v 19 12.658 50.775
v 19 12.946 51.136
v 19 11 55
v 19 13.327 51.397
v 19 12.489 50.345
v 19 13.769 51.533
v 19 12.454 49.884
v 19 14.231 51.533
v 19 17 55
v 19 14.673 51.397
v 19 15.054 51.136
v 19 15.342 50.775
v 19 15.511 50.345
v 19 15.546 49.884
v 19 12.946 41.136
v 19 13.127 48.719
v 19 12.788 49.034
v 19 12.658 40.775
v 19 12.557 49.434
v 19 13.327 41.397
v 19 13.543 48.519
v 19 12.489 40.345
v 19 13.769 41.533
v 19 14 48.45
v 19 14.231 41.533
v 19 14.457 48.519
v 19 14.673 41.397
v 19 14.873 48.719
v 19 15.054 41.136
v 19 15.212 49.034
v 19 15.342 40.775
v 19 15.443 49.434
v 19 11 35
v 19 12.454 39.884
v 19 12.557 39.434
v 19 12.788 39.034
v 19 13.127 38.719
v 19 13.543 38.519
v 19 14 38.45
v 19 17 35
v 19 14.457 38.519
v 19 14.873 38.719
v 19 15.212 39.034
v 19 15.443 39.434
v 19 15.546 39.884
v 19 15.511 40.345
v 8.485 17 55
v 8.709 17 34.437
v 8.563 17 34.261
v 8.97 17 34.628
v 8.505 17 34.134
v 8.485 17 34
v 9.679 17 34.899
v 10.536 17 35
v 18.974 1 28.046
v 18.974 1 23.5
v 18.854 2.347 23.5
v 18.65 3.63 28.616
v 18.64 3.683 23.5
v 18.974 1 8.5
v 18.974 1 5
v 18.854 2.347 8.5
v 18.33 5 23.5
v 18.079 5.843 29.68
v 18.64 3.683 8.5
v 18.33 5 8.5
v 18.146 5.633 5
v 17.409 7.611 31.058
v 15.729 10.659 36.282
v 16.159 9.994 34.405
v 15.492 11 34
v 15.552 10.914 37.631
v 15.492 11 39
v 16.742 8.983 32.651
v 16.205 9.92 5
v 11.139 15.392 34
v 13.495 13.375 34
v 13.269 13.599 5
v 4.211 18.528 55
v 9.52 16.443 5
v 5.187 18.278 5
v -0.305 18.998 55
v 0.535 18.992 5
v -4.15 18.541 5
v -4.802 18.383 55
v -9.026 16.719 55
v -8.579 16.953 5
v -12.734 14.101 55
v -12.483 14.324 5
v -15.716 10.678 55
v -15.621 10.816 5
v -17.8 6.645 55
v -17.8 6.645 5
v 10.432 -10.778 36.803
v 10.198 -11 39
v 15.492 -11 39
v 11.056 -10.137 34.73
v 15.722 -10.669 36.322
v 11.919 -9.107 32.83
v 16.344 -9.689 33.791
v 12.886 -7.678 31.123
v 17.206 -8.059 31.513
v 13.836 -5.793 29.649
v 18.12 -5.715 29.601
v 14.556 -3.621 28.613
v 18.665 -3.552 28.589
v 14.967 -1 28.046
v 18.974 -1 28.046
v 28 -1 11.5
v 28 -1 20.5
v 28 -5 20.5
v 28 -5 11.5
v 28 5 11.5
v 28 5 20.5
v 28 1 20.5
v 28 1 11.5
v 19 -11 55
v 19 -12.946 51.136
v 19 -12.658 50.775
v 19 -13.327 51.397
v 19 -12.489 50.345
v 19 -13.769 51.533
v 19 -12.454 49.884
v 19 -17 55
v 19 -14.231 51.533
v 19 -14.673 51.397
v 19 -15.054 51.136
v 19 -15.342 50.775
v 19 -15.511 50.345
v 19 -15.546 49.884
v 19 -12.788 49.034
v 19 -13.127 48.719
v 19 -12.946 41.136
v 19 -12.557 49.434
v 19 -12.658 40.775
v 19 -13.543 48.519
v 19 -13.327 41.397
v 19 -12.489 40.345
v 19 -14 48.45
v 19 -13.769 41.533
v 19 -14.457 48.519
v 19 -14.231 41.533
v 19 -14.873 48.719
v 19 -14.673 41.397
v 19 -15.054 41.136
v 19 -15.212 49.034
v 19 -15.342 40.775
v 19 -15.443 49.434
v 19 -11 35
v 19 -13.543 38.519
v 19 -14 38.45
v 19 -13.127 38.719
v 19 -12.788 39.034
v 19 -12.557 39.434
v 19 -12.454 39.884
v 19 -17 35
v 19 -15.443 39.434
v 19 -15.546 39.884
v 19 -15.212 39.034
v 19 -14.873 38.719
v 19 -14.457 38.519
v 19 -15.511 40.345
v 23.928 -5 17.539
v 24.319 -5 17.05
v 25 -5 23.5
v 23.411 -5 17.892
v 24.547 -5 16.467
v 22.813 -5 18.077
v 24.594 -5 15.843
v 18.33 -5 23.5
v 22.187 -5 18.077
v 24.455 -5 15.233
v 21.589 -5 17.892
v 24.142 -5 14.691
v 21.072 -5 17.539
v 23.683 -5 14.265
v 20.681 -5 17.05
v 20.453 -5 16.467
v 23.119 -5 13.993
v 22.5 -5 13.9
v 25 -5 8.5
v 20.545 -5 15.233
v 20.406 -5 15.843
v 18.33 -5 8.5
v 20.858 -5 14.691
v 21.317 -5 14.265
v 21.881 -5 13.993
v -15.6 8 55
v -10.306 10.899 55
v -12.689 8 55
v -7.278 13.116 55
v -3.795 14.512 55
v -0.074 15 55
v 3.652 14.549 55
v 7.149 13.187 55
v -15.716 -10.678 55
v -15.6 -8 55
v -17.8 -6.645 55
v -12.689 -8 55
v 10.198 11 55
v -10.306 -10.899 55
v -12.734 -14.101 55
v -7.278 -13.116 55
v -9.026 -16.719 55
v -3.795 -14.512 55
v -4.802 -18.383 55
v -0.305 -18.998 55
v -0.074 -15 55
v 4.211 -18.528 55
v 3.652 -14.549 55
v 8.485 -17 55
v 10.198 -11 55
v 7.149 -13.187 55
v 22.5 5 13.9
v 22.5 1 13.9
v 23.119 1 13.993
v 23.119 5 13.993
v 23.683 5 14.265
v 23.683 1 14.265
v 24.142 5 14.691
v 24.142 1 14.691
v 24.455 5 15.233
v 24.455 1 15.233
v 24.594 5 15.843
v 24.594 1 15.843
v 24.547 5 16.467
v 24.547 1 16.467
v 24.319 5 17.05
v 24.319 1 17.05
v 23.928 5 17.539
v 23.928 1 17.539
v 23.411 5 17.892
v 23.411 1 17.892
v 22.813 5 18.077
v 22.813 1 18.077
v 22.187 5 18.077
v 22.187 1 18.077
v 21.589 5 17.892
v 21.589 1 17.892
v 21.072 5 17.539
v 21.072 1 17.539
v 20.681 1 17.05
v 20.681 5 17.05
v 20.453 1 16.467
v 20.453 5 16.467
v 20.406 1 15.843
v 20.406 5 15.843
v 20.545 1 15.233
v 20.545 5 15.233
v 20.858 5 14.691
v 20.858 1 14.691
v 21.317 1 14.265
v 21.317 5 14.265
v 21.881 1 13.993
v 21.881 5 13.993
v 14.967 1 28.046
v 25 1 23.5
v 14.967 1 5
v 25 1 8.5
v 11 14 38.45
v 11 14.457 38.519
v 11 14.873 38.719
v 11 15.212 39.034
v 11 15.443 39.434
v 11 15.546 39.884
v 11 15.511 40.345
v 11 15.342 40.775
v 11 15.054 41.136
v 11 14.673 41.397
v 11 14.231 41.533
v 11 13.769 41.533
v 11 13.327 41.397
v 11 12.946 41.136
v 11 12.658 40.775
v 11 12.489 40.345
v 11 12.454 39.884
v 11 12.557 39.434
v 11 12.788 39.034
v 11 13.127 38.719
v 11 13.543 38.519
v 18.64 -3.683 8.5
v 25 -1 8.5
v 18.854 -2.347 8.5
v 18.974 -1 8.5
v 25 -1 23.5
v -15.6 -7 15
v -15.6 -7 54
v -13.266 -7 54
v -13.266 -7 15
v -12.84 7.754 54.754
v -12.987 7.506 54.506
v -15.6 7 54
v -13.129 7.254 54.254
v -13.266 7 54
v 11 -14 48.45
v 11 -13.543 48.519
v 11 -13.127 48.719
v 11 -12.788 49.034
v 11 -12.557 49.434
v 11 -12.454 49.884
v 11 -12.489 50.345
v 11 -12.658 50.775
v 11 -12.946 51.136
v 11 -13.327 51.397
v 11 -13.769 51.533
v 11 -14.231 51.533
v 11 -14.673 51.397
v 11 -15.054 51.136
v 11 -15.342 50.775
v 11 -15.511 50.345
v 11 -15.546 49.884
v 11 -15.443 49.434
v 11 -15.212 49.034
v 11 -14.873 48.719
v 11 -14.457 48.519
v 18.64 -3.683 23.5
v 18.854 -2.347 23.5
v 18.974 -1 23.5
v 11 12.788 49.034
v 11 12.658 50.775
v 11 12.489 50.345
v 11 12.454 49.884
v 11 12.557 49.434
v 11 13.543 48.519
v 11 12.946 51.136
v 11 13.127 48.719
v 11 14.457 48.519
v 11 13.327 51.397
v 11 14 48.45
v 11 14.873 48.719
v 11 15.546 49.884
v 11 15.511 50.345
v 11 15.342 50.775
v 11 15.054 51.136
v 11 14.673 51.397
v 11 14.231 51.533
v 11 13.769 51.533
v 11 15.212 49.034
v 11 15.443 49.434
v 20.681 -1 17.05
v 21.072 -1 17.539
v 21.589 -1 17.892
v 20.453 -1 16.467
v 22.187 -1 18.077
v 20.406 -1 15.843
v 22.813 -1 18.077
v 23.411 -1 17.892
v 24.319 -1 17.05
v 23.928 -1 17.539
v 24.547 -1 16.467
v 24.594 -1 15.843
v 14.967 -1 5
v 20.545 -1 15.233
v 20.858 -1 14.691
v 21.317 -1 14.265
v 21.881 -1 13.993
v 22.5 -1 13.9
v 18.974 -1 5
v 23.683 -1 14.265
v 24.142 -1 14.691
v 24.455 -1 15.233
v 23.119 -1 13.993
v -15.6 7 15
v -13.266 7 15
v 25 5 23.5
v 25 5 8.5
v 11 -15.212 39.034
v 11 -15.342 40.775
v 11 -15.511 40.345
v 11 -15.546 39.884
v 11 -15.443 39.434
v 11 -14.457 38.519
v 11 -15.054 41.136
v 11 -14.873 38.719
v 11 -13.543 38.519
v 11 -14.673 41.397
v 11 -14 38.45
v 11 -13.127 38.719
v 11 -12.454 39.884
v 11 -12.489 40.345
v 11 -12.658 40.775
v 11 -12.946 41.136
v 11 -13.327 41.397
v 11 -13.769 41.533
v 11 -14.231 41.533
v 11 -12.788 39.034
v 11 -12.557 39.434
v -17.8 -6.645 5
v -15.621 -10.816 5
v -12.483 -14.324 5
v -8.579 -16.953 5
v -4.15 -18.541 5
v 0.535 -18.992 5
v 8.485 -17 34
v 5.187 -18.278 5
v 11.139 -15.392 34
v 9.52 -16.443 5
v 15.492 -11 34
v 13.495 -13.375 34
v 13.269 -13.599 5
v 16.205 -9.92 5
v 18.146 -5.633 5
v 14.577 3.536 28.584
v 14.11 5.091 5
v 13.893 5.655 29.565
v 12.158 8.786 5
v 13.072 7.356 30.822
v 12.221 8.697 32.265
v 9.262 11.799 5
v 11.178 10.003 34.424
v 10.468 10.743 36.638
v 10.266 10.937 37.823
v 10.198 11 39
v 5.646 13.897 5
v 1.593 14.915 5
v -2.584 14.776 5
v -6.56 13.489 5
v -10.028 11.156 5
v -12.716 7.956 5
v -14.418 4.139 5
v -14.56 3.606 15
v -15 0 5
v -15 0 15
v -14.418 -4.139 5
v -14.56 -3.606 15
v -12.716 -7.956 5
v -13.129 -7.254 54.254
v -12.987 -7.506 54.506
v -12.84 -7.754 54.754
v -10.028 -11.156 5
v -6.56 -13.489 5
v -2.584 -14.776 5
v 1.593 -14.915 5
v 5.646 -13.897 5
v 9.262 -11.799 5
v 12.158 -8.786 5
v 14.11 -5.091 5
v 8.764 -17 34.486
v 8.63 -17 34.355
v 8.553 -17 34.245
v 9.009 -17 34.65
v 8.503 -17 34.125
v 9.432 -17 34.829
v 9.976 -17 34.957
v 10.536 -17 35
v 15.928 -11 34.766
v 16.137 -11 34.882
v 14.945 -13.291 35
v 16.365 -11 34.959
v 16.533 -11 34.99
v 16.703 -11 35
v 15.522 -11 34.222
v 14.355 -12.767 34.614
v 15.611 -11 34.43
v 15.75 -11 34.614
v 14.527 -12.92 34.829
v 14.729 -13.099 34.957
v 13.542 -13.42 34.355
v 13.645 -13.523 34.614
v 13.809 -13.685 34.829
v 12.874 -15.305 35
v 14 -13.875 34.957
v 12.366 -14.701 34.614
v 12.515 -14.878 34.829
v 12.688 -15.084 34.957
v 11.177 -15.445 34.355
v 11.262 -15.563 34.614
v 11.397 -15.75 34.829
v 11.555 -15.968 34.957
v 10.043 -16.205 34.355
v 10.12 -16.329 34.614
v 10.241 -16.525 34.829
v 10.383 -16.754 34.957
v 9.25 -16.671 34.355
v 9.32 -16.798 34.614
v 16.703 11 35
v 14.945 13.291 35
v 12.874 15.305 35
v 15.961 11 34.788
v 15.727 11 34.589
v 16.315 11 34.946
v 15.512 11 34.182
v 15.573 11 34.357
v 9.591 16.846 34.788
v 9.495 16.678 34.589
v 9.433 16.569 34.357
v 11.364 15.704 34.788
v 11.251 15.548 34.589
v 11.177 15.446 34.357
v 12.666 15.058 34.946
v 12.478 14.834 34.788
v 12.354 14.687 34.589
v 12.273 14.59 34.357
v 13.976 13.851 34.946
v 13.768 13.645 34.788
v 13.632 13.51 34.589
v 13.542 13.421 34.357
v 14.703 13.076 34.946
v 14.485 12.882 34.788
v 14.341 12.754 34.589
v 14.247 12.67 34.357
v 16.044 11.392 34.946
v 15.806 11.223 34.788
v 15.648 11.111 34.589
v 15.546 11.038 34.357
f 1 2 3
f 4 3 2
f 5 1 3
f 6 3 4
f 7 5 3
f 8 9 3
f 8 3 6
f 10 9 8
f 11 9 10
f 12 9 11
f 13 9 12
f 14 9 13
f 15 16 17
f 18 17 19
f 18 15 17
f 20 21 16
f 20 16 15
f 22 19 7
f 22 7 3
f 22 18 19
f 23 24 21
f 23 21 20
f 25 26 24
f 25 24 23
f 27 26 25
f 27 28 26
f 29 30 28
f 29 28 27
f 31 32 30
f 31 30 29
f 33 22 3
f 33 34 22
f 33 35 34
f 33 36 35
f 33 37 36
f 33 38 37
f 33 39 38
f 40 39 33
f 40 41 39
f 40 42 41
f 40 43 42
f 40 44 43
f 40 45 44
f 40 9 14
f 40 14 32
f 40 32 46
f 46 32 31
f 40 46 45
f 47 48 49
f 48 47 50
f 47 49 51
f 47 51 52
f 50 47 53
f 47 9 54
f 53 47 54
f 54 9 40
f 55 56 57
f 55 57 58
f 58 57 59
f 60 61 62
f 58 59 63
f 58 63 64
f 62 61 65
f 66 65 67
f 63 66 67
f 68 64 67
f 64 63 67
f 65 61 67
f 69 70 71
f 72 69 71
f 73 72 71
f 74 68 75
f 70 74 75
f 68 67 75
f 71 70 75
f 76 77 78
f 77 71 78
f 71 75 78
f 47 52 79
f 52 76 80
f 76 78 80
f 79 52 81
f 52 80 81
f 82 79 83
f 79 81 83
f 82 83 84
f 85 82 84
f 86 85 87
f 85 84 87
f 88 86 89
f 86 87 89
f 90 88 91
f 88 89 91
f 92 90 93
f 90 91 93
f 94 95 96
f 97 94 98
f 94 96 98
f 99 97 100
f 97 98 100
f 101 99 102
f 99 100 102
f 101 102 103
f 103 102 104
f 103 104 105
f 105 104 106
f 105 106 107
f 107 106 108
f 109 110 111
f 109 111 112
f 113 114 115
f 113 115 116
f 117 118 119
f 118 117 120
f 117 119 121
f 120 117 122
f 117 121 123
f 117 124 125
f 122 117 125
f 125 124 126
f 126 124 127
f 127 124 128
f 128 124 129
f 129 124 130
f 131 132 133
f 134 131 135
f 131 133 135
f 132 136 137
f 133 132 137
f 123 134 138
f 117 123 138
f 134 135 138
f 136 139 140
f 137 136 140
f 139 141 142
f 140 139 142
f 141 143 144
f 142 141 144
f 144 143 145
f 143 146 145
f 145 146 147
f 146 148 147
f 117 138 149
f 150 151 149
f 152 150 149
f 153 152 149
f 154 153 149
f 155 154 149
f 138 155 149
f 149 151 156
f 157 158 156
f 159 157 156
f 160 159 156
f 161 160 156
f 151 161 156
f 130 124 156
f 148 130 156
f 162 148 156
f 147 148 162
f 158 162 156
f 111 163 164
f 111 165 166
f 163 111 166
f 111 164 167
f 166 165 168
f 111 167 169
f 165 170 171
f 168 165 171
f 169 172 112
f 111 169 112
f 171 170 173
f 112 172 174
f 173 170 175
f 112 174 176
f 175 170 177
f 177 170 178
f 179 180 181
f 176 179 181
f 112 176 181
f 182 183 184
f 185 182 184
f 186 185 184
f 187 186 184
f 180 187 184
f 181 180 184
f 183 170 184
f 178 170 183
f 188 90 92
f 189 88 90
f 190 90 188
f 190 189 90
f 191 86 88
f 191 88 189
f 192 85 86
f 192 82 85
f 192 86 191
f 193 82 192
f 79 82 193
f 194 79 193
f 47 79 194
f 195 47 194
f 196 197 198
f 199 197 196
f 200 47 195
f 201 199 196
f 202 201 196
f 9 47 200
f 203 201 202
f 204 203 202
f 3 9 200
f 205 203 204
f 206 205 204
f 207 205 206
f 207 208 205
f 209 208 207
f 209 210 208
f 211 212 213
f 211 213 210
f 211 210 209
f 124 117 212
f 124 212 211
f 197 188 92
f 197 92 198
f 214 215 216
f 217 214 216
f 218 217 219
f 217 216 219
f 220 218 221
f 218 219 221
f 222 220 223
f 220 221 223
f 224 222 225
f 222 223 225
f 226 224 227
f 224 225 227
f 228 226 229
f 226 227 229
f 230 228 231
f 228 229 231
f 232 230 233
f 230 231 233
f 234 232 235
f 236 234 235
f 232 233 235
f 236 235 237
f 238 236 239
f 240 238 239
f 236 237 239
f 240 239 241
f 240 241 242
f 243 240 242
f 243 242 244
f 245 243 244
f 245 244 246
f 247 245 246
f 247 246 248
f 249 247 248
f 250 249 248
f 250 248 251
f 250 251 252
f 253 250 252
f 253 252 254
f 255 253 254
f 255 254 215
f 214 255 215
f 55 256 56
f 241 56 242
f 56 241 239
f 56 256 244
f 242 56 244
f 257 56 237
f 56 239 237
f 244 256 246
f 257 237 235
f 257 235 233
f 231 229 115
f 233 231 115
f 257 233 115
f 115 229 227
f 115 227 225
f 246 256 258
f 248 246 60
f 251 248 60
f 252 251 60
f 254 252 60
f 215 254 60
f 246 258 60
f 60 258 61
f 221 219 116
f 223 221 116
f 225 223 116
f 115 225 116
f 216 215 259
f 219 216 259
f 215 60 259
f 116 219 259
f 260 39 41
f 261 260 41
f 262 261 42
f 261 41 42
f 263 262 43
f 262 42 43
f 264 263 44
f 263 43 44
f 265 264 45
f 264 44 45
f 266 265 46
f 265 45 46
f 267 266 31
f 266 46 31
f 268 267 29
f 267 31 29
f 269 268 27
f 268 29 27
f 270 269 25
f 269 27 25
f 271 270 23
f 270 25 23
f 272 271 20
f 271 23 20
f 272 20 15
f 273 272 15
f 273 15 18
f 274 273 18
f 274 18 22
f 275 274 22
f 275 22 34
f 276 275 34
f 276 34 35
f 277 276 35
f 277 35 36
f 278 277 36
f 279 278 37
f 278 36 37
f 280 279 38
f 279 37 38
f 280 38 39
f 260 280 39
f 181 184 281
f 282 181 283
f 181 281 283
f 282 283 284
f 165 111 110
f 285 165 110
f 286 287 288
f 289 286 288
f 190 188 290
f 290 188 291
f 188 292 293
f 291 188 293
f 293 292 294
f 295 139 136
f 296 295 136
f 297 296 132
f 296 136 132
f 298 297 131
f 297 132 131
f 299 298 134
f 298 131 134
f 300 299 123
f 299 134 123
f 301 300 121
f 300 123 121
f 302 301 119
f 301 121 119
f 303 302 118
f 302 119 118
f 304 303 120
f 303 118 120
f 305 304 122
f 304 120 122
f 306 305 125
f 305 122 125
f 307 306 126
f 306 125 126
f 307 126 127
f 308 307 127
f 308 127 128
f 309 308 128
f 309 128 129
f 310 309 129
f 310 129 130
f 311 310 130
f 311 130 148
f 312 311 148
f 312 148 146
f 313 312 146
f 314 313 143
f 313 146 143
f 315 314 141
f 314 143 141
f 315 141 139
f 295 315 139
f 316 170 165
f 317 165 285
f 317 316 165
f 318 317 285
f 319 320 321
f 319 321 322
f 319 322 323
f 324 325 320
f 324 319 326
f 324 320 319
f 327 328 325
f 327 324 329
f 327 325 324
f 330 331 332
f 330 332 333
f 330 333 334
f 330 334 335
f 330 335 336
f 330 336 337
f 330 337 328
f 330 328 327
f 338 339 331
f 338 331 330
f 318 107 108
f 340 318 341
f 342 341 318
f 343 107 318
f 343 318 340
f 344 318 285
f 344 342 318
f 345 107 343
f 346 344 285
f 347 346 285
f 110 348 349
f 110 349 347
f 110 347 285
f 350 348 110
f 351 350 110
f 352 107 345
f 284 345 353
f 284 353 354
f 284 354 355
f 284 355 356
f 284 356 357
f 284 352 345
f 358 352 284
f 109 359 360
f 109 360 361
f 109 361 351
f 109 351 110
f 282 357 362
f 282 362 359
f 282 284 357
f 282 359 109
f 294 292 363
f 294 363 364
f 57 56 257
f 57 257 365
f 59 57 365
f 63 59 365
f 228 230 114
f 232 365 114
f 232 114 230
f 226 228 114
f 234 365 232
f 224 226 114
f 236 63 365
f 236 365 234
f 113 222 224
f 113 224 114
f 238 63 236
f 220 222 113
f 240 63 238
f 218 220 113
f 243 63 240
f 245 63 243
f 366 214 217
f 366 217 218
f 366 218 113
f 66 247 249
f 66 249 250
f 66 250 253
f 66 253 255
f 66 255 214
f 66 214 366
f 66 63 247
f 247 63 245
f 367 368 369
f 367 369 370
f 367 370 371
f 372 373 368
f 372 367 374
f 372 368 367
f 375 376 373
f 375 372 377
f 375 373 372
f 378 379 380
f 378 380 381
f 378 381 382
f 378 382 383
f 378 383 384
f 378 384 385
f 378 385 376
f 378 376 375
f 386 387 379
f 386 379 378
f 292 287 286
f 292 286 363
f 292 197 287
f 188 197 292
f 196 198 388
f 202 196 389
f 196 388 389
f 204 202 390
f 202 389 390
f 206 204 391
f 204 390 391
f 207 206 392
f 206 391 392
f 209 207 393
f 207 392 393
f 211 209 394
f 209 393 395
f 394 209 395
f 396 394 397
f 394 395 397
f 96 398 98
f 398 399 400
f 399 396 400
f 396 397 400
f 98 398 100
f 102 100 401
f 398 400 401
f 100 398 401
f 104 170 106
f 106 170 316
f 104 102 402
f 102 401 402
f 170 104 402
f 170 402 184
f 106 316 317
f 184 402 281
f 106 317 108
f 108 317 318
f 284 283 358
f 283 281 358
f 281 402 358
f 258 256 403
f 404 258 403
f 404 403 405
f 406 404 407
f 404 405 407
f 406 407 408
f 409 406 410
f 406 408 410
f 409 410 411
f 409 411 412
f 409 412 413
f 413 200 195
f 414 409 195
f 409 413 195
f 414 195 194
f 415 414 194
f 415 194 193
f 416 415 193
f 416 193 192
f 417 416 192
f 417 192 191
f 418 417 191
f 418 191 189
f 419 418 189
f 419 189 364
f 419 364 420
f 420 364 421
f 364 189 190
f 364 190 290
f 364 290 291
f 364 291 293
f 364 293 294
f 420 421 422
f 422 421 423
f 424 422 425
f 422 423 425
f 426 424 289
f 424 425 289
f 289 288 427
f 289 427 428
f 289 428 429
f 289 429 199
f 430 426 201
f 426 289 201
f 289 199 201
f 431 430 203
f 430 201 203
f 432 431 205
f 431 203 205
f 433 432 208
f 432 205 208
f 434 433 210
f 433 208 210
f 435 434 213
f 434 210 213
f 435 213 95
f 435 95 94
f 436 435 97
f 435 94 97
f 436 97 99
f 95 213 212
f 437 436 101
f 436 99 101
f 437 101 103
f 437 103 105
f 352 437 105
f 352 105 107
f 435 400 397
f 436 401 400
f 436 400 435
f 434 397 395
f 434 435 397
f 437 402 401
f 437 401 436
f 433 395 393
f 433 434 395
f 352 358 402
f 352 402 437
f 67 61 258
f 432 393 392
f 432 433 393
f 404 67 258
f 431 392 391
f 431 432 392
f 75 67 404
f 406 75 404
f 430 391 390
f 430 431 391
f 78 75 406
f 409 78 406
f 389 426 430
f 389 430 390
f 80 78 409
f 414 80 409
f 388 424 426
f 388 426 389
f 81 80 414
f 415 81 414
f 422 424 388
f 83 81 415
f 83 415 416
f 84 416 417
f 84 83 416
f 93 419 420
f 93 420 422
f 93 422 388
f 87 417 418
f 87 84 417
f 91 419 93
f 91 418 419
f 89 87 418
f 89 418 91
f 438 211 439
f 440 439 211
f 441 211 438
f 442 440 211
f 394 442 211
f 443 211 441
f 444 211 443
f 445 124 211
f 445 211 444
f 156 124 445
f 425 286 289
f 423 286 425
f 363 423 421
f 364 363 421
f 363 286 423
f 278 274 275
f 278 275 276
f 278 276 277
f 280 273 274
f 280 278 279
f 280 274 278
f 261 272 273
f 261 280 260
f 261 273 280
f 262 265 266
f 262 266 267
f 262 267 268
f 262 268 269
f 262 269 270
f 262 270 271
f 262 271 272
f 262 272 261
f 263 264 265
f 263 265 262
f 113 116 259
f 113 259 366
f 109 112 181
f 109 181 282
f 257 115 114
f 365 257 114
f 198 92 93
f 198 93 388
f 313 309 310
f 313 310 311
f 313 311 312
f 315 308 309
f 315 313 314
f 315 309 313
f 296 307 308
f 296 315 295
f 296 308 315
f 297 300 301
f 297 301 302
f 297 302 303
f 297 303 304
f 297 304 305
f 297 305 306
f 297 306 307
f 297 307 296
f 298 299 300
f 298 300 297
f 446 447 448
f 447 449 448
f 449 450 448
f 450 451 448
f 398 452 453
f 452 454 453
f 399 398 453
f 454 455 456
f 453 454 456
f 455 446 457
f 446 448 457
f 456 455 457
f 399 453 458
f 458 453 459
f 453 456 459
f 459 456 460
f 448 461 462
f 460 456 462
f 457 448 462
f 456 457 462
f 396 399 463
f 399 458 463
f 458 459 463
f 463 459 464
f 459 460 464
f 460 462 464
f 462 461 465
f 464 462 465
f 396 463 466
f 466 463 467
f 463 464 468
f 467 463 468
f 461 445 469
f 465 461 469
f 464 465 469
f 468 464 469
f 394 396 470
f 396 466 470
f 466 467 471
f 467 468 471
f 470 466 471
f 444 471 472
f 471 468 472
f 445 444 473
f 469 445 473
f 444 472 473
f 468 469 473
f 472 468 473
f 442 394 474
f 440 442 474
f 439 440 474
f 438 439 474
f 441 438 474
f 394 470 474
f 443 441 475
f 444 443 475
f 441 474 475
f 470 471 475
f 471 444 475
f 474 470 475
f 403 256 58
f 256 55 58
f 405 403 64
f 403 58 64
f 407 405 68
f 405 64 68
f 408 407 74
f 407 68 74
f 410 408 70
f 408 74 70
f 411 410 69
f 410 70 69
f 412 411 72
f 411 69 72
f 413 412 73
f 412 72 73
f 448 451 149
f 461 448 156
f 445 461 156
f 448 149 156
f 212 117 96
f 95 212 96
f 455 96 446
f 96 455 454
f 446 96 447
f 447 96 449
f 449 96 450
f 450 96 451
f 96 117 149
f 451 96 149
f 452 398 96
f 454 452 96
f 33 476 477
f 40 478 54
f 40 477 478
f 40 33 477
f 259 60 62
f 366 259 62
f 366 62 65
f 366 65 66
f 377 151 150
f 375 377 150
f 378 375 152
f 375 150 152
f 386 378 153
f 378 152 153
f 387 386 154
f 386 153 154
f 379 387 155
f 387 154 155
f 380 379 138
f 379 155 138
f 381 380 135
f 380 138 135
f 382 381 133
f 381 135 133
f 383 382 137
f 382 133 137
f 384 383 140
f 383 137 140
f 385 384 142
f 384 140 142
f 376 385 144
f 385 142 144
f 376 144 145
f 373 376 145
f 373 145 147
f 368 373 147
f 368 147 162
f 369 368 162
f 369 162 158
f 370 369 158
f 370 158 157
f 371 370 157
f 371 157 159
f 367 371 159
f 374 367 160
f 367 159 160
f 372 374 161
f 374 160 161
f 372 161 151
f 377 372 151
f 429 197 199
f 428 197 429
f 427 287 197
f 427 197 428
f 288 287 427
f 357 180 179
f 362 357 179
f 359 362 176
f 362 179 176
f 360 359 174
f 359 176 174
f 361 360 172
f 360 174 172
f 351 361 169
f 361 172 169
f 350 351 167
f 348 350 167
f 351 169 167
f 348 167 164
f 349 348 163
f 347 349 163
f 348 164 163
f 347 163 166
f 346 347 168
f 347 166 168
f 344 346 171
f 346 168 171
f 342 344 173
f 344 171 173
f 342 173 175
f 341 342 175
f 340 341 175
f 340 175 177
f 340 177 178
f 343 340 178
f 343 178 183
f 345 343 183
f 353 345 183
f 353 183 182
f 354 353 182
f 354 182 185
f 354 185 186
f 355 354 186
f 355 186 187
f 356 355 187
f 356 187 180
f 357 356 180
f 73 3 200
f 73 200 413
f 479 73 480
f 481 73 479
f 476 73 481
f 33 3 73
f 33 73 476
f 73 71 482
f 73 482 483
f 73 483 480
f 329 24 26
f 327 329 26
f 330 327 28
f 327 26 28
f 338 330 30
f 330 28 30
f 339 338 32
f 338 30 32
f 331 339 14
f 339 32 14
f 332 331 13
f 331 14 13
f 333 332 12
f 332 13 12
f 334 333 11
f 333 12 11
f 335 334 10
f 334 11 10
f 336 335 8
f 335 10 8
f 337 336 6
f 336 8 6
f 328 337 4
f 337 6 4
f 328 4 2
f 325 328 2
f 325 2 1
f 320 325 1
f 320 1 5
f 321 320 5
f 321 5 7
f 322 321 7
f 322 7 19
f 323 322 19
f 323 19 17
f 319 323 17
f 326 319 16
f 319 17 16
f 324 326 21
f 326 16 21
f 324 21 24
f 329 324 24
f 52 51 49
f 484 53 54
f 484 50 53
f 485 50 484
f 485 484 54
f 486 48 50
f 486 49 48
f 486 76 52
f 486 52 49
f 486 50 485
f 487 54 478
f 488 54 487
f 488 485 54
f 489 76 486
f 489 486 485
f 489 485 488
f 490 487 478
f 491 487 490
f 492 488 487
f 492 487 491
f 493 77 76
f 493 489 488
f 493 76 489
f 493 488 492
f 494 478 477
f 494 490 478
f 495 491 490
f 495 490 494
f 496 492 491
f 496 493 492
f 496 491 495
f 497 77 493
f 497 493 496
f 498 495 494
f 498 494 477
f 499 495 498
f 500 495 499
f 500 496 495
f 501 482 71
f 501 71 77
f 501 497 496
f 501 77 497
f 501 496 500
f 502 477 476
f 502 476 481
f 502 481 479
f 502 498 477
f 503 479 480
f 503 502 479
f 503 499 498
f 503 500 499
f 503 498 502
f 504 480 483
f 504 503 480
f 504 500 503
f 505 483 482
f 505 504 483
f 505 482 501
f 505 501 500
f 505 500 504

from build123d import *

# Parameters (mm, degrees)
SKETCH_1_R                = 19
EXTRUDE_2_DEPTH           = 55
SKETCH_11_W               = 5
SKETCH_11_H               = 14
CUT_EXTRUDE_10_DEPTH      = 40
EXTRUDE_4_DEPTH           = 9
EXTRUDE_4_DEPTH_BACK      = 2
SKETCH_12_W               = 15
SKETCH_12_H               = 10
SKETCH_13_R               = 2.1
CUT_EXTRUDE_11_DEPTH      = 67.219332525
SKETCH_19_R               = 19
CUT_EXTRUDE_17_DEPTH      = 5
CUT_EXTRUDE_19_DEPTH      = 61.373835392
CUT_EXTRUDE_20_DEPTH      = 47.230401253
CUT_EXTRUDE_20_DEPTH_BACK = 47.230401253
SKETCH_14_W               = 20
SKETCH_14_H               = 2
CUT_EXTRUDE_21_DEPTH      = 10
SKETCH_24_W               = 20
SKETCH_24_H               = 6
EXTRUDE_5_DEPTH           = 20
SKETCH_3_R                = 15
CUT_EXTRUDE_1_DEPTH       = 61.373835507
CHAMFER_2_SIZE            = 3
CHAMFER_3_SIZE            = 1
FILLET_2_R                = 1
SKETCH_25_R               = 1.55
CUT_EXTRUDE_22_DEPTH      = 8
PATTERN_LINEAR_1_COUNT    = 2
PATTERN_LINEAR_1_PITCH    = 10
MIRROR_2_COPY_1_SKETCH_R  = 1.55
MIRROR_2_COPY_1_DEPTH     = 8
MIRROR_2_COPY_2_SKETCH_R  = 1.55
MIRROR_2_COPY_2_DEPTH     = 8
FILLET_2_OF_MIRROR_2_R    = 1


with BuildPart() as part:
    # 草圖1 → 填料-伸長2 (new body)
    with BuildSketch(Plane.XY):
        Circle(SKETCH_1_R)
    extrude(amount=EXTRUDE_2_DEPTH)

    # 草圖11 → 除料-伸長10 (cut)
    with BuildSketch(Plane.XY.offset(55)):
        with Locations((-13.1, 0)):
            Rectangle(SKETCH_11_W, SKETCH_11_H)
    extrude(amount=-CUT_EXTRUDE_10_DEPTH, mode=Mode.SUBTRACT)

    # 草圖12 → 填料-伸長4 (add, two sides: drawn at the far end of the back side and taken through both)
    with BuildSketch(Plane(origin=(19, 0, 0), x_dir=(0, 0, -1), z_dir=(1, 0, 0)).offset(-EXTRUDE_4_DEPTH_BACK)):
        with Locations((-16, 0)):
            Rectangle(SKETCH_12_W, SKETCH_12_H)
    extrude(amount=EXTRUDE_4_DEPTH + EXTRUDE_4_DEPTH_BACK)

    # 草圖13 → 除料-伸長11 (cut, through all)
    with BuildSketch(Plane.XZ.offset(5)):
        with Locations(Location((22.5, 16, 0), (0, 0, 270))):
            Circle(SKETCH_13_R)
    extrude(amount=-CUT_EXTRUDE_11_DEPTH, mode=Mode.SUBTRACT)

    # 草圖19 → 除料-伸長17 (cut)
    with BuildSketch(Plane(origin=(0, 0, 0), x_dir=(-1, 0, 0), z_dir=(0, 0, -1))):
        Circle(SKETCH_19_R)
    extrude(amount=-CUT_EXTRUDE_17_DEPTH, mode=Mode.SUBTRACT)

    # 草圖22 → 除料-伸長19 (cut, through all)
    with BuildSketch(Plane(origin=(0, 0, 5), x_dir=(-1, 0, 0), z_dir=(0, 0, -1))):
        with BuildLine():
            Line((17.8, 6.64529909), (17.8, -6.64529909))
            ThreePointArc((17.8, -6.64529909), (19, 0), (17.8, 6.64529909))
        make_face()
    extrude(amount=-CUT_EXTRUDE_19_DEPTH, mode=Mode.SUBTRACT)

    # 草圖14 → 除料-伸長20 (cut, two sides: drawn at the far end of the back side and taken through both)
    with BuildSketch(Plane.XY.offset(23.5).offset(-CUT_EXTRUDE_20_DEPTH_BACK)):
        with Locations((23.16515139, 0)):
            Rectangle(SKETCH_14_W, SKETCH_14_H)
    extrude(amount=CUT_EXTRUDE_20_DEPTH + CUT_EXTRUDE_20_DEPTH_BACK, mode=Mode.SUBTRACT)

    # 草圖23 → 除料-伸長21 (cut)
    with BuildSketch(Plane(origin=(19, 0, 0), x_dir=(0, 0, -1), z_dir=(1, 0, 0))):
        with BuildLine():
            Line((-39, 11), (-55, 11))
            Line((-55, 11), (-55, -11))
            Line((-55, -11), (-39, -11))
            ThreePointArc((-39, -11), (-28, 0), (-39, 11))
        make_face()
    extrude(amount=-CUT_EXTRUDE_21_DEPTH, mode=Mode.SUBTRACT)

    # 草圖24 → 填料-伸長5 (add)
    with BuildSketch(Plane(origin=(19, 0, 0), x_dir=(0, 0, -1), z_dir=(1, 0, 0))):
        with Locations((-45, 14)):
            Rectangle(SKETCH_24_W, SKETCH_24_H)
    extrude_5 = extrude(amount=-EXTRUDE_5_DEPTH)

    # 草圖3 → 除料-伸長1 (cut, through all)
    with BuildSketch(Plane.XY.offset(55)):
        Circle(SKETCH_3_R)
    cut_extrude_1 = extrude(amount=-CUT_EXTRUDE_1_DEPTH, mode=Mode.SUBTRACT)

    # 導角2
    chamfer_2_edges = [part.edges().sort_by_distance(p)[0] for p in [
        (28, 3, 23.5),
        (28, -3, 8.5),
        (28, -3, 23.5),
        (28, 3, 8.5),
    ]]
    chamfer(chamfer_2_edges, length=CHAMFER_2_SIZE)

    # 導角3
    chamfer_3_edges = [part.edges().sort_by_distance(p)[0] for p in [
        (-14.433249581, 7, 55),
        (-14.433249581, -7, 55),
    ]]
    chamfer(chamfer_3_edges, length=CHAMFER_3_SIZE)

    # 圓角2
    fillet_2_edges = [part.edges().sort_by_distance(p)[0] for p in [
        (12.35826472, 14.431676725, 35),
    ]]
    fillet(fillet_2_edges, radius=FILLET_2_R)

    # 草圖25 → 除料-伸長22 (cut)
    with BuildSketch(Plane(origin=(19, 0, 0), x_dir=(0, 0, -1), z_dir=(1, 0, 0))):
        with Locations((-50, 14)):
            Circle(SKETCH_25_R)
    cut_extrude_22 = extrude(amount=-CUT_EXTRUDE_22_DEPTH, mode=Mode.SUBTRACT)

    # 直線複製排列1: 除料-伸長22 ×2
    with Locations(*[(0, 0, -i * PATTERN_LINEAR_1_PITCH) for i in range(1, PATTERN_LINEAR_1_COUNT)]):
        add(cut_extrude_22, mode=Mode.SUBTRACT)

    # 鏡射2: 填料-伸長5, 除料-伸長1 across plane
    add(extrude_5.mirror(Plane.ZX))
    add(cut_extrude_1.mirror(Plane.ZX), mode=Mode.SUBTRACT)

    # 鏡射2 copy 1 sketch → 鏡射2 copy 1 (cut)
    with BuildSketch(Plane(origin=(19, 0, -10), x_dir=(0, 0, -1), z_dir=(1, 0, 0))):
        with Locations((-50, -14)):
            Circle(MIRROR_2_COPY_1_SKETCH_R)
    extrude(amount=-MIRROR_2_COPY_1_DEPTH, mode=Mode.SUBTRACT)

    # 鏡射2 copy 2 sketch → 鏡射2 copy 2 (cut)
    with BuildSketch(Plane(origin=(19, 0, 0), x_dir=(0, 0, -1), z_dir=(1, 0, 0))):
        with Locations((-50, -14)):
            Circle(MIRROR_2_COPY_2_SKETCH_R)
    extrude(amount=-MIRROR_2_COPY_2_DEPTH, mode=Mode.SUBTRACT)

    # 圓角2 of 鏡射2
    fillet_2_of_mirror_2_edges = [part.edges().sort_by_distance(p)[0] for p in [
        (12.35826472, -14.431676725, 35),
    ]]
    fillet(fillet_2_of_mirror_2_edges, radius=FILLET_2_OF_MIRROR_2_R)


solid = part.part
